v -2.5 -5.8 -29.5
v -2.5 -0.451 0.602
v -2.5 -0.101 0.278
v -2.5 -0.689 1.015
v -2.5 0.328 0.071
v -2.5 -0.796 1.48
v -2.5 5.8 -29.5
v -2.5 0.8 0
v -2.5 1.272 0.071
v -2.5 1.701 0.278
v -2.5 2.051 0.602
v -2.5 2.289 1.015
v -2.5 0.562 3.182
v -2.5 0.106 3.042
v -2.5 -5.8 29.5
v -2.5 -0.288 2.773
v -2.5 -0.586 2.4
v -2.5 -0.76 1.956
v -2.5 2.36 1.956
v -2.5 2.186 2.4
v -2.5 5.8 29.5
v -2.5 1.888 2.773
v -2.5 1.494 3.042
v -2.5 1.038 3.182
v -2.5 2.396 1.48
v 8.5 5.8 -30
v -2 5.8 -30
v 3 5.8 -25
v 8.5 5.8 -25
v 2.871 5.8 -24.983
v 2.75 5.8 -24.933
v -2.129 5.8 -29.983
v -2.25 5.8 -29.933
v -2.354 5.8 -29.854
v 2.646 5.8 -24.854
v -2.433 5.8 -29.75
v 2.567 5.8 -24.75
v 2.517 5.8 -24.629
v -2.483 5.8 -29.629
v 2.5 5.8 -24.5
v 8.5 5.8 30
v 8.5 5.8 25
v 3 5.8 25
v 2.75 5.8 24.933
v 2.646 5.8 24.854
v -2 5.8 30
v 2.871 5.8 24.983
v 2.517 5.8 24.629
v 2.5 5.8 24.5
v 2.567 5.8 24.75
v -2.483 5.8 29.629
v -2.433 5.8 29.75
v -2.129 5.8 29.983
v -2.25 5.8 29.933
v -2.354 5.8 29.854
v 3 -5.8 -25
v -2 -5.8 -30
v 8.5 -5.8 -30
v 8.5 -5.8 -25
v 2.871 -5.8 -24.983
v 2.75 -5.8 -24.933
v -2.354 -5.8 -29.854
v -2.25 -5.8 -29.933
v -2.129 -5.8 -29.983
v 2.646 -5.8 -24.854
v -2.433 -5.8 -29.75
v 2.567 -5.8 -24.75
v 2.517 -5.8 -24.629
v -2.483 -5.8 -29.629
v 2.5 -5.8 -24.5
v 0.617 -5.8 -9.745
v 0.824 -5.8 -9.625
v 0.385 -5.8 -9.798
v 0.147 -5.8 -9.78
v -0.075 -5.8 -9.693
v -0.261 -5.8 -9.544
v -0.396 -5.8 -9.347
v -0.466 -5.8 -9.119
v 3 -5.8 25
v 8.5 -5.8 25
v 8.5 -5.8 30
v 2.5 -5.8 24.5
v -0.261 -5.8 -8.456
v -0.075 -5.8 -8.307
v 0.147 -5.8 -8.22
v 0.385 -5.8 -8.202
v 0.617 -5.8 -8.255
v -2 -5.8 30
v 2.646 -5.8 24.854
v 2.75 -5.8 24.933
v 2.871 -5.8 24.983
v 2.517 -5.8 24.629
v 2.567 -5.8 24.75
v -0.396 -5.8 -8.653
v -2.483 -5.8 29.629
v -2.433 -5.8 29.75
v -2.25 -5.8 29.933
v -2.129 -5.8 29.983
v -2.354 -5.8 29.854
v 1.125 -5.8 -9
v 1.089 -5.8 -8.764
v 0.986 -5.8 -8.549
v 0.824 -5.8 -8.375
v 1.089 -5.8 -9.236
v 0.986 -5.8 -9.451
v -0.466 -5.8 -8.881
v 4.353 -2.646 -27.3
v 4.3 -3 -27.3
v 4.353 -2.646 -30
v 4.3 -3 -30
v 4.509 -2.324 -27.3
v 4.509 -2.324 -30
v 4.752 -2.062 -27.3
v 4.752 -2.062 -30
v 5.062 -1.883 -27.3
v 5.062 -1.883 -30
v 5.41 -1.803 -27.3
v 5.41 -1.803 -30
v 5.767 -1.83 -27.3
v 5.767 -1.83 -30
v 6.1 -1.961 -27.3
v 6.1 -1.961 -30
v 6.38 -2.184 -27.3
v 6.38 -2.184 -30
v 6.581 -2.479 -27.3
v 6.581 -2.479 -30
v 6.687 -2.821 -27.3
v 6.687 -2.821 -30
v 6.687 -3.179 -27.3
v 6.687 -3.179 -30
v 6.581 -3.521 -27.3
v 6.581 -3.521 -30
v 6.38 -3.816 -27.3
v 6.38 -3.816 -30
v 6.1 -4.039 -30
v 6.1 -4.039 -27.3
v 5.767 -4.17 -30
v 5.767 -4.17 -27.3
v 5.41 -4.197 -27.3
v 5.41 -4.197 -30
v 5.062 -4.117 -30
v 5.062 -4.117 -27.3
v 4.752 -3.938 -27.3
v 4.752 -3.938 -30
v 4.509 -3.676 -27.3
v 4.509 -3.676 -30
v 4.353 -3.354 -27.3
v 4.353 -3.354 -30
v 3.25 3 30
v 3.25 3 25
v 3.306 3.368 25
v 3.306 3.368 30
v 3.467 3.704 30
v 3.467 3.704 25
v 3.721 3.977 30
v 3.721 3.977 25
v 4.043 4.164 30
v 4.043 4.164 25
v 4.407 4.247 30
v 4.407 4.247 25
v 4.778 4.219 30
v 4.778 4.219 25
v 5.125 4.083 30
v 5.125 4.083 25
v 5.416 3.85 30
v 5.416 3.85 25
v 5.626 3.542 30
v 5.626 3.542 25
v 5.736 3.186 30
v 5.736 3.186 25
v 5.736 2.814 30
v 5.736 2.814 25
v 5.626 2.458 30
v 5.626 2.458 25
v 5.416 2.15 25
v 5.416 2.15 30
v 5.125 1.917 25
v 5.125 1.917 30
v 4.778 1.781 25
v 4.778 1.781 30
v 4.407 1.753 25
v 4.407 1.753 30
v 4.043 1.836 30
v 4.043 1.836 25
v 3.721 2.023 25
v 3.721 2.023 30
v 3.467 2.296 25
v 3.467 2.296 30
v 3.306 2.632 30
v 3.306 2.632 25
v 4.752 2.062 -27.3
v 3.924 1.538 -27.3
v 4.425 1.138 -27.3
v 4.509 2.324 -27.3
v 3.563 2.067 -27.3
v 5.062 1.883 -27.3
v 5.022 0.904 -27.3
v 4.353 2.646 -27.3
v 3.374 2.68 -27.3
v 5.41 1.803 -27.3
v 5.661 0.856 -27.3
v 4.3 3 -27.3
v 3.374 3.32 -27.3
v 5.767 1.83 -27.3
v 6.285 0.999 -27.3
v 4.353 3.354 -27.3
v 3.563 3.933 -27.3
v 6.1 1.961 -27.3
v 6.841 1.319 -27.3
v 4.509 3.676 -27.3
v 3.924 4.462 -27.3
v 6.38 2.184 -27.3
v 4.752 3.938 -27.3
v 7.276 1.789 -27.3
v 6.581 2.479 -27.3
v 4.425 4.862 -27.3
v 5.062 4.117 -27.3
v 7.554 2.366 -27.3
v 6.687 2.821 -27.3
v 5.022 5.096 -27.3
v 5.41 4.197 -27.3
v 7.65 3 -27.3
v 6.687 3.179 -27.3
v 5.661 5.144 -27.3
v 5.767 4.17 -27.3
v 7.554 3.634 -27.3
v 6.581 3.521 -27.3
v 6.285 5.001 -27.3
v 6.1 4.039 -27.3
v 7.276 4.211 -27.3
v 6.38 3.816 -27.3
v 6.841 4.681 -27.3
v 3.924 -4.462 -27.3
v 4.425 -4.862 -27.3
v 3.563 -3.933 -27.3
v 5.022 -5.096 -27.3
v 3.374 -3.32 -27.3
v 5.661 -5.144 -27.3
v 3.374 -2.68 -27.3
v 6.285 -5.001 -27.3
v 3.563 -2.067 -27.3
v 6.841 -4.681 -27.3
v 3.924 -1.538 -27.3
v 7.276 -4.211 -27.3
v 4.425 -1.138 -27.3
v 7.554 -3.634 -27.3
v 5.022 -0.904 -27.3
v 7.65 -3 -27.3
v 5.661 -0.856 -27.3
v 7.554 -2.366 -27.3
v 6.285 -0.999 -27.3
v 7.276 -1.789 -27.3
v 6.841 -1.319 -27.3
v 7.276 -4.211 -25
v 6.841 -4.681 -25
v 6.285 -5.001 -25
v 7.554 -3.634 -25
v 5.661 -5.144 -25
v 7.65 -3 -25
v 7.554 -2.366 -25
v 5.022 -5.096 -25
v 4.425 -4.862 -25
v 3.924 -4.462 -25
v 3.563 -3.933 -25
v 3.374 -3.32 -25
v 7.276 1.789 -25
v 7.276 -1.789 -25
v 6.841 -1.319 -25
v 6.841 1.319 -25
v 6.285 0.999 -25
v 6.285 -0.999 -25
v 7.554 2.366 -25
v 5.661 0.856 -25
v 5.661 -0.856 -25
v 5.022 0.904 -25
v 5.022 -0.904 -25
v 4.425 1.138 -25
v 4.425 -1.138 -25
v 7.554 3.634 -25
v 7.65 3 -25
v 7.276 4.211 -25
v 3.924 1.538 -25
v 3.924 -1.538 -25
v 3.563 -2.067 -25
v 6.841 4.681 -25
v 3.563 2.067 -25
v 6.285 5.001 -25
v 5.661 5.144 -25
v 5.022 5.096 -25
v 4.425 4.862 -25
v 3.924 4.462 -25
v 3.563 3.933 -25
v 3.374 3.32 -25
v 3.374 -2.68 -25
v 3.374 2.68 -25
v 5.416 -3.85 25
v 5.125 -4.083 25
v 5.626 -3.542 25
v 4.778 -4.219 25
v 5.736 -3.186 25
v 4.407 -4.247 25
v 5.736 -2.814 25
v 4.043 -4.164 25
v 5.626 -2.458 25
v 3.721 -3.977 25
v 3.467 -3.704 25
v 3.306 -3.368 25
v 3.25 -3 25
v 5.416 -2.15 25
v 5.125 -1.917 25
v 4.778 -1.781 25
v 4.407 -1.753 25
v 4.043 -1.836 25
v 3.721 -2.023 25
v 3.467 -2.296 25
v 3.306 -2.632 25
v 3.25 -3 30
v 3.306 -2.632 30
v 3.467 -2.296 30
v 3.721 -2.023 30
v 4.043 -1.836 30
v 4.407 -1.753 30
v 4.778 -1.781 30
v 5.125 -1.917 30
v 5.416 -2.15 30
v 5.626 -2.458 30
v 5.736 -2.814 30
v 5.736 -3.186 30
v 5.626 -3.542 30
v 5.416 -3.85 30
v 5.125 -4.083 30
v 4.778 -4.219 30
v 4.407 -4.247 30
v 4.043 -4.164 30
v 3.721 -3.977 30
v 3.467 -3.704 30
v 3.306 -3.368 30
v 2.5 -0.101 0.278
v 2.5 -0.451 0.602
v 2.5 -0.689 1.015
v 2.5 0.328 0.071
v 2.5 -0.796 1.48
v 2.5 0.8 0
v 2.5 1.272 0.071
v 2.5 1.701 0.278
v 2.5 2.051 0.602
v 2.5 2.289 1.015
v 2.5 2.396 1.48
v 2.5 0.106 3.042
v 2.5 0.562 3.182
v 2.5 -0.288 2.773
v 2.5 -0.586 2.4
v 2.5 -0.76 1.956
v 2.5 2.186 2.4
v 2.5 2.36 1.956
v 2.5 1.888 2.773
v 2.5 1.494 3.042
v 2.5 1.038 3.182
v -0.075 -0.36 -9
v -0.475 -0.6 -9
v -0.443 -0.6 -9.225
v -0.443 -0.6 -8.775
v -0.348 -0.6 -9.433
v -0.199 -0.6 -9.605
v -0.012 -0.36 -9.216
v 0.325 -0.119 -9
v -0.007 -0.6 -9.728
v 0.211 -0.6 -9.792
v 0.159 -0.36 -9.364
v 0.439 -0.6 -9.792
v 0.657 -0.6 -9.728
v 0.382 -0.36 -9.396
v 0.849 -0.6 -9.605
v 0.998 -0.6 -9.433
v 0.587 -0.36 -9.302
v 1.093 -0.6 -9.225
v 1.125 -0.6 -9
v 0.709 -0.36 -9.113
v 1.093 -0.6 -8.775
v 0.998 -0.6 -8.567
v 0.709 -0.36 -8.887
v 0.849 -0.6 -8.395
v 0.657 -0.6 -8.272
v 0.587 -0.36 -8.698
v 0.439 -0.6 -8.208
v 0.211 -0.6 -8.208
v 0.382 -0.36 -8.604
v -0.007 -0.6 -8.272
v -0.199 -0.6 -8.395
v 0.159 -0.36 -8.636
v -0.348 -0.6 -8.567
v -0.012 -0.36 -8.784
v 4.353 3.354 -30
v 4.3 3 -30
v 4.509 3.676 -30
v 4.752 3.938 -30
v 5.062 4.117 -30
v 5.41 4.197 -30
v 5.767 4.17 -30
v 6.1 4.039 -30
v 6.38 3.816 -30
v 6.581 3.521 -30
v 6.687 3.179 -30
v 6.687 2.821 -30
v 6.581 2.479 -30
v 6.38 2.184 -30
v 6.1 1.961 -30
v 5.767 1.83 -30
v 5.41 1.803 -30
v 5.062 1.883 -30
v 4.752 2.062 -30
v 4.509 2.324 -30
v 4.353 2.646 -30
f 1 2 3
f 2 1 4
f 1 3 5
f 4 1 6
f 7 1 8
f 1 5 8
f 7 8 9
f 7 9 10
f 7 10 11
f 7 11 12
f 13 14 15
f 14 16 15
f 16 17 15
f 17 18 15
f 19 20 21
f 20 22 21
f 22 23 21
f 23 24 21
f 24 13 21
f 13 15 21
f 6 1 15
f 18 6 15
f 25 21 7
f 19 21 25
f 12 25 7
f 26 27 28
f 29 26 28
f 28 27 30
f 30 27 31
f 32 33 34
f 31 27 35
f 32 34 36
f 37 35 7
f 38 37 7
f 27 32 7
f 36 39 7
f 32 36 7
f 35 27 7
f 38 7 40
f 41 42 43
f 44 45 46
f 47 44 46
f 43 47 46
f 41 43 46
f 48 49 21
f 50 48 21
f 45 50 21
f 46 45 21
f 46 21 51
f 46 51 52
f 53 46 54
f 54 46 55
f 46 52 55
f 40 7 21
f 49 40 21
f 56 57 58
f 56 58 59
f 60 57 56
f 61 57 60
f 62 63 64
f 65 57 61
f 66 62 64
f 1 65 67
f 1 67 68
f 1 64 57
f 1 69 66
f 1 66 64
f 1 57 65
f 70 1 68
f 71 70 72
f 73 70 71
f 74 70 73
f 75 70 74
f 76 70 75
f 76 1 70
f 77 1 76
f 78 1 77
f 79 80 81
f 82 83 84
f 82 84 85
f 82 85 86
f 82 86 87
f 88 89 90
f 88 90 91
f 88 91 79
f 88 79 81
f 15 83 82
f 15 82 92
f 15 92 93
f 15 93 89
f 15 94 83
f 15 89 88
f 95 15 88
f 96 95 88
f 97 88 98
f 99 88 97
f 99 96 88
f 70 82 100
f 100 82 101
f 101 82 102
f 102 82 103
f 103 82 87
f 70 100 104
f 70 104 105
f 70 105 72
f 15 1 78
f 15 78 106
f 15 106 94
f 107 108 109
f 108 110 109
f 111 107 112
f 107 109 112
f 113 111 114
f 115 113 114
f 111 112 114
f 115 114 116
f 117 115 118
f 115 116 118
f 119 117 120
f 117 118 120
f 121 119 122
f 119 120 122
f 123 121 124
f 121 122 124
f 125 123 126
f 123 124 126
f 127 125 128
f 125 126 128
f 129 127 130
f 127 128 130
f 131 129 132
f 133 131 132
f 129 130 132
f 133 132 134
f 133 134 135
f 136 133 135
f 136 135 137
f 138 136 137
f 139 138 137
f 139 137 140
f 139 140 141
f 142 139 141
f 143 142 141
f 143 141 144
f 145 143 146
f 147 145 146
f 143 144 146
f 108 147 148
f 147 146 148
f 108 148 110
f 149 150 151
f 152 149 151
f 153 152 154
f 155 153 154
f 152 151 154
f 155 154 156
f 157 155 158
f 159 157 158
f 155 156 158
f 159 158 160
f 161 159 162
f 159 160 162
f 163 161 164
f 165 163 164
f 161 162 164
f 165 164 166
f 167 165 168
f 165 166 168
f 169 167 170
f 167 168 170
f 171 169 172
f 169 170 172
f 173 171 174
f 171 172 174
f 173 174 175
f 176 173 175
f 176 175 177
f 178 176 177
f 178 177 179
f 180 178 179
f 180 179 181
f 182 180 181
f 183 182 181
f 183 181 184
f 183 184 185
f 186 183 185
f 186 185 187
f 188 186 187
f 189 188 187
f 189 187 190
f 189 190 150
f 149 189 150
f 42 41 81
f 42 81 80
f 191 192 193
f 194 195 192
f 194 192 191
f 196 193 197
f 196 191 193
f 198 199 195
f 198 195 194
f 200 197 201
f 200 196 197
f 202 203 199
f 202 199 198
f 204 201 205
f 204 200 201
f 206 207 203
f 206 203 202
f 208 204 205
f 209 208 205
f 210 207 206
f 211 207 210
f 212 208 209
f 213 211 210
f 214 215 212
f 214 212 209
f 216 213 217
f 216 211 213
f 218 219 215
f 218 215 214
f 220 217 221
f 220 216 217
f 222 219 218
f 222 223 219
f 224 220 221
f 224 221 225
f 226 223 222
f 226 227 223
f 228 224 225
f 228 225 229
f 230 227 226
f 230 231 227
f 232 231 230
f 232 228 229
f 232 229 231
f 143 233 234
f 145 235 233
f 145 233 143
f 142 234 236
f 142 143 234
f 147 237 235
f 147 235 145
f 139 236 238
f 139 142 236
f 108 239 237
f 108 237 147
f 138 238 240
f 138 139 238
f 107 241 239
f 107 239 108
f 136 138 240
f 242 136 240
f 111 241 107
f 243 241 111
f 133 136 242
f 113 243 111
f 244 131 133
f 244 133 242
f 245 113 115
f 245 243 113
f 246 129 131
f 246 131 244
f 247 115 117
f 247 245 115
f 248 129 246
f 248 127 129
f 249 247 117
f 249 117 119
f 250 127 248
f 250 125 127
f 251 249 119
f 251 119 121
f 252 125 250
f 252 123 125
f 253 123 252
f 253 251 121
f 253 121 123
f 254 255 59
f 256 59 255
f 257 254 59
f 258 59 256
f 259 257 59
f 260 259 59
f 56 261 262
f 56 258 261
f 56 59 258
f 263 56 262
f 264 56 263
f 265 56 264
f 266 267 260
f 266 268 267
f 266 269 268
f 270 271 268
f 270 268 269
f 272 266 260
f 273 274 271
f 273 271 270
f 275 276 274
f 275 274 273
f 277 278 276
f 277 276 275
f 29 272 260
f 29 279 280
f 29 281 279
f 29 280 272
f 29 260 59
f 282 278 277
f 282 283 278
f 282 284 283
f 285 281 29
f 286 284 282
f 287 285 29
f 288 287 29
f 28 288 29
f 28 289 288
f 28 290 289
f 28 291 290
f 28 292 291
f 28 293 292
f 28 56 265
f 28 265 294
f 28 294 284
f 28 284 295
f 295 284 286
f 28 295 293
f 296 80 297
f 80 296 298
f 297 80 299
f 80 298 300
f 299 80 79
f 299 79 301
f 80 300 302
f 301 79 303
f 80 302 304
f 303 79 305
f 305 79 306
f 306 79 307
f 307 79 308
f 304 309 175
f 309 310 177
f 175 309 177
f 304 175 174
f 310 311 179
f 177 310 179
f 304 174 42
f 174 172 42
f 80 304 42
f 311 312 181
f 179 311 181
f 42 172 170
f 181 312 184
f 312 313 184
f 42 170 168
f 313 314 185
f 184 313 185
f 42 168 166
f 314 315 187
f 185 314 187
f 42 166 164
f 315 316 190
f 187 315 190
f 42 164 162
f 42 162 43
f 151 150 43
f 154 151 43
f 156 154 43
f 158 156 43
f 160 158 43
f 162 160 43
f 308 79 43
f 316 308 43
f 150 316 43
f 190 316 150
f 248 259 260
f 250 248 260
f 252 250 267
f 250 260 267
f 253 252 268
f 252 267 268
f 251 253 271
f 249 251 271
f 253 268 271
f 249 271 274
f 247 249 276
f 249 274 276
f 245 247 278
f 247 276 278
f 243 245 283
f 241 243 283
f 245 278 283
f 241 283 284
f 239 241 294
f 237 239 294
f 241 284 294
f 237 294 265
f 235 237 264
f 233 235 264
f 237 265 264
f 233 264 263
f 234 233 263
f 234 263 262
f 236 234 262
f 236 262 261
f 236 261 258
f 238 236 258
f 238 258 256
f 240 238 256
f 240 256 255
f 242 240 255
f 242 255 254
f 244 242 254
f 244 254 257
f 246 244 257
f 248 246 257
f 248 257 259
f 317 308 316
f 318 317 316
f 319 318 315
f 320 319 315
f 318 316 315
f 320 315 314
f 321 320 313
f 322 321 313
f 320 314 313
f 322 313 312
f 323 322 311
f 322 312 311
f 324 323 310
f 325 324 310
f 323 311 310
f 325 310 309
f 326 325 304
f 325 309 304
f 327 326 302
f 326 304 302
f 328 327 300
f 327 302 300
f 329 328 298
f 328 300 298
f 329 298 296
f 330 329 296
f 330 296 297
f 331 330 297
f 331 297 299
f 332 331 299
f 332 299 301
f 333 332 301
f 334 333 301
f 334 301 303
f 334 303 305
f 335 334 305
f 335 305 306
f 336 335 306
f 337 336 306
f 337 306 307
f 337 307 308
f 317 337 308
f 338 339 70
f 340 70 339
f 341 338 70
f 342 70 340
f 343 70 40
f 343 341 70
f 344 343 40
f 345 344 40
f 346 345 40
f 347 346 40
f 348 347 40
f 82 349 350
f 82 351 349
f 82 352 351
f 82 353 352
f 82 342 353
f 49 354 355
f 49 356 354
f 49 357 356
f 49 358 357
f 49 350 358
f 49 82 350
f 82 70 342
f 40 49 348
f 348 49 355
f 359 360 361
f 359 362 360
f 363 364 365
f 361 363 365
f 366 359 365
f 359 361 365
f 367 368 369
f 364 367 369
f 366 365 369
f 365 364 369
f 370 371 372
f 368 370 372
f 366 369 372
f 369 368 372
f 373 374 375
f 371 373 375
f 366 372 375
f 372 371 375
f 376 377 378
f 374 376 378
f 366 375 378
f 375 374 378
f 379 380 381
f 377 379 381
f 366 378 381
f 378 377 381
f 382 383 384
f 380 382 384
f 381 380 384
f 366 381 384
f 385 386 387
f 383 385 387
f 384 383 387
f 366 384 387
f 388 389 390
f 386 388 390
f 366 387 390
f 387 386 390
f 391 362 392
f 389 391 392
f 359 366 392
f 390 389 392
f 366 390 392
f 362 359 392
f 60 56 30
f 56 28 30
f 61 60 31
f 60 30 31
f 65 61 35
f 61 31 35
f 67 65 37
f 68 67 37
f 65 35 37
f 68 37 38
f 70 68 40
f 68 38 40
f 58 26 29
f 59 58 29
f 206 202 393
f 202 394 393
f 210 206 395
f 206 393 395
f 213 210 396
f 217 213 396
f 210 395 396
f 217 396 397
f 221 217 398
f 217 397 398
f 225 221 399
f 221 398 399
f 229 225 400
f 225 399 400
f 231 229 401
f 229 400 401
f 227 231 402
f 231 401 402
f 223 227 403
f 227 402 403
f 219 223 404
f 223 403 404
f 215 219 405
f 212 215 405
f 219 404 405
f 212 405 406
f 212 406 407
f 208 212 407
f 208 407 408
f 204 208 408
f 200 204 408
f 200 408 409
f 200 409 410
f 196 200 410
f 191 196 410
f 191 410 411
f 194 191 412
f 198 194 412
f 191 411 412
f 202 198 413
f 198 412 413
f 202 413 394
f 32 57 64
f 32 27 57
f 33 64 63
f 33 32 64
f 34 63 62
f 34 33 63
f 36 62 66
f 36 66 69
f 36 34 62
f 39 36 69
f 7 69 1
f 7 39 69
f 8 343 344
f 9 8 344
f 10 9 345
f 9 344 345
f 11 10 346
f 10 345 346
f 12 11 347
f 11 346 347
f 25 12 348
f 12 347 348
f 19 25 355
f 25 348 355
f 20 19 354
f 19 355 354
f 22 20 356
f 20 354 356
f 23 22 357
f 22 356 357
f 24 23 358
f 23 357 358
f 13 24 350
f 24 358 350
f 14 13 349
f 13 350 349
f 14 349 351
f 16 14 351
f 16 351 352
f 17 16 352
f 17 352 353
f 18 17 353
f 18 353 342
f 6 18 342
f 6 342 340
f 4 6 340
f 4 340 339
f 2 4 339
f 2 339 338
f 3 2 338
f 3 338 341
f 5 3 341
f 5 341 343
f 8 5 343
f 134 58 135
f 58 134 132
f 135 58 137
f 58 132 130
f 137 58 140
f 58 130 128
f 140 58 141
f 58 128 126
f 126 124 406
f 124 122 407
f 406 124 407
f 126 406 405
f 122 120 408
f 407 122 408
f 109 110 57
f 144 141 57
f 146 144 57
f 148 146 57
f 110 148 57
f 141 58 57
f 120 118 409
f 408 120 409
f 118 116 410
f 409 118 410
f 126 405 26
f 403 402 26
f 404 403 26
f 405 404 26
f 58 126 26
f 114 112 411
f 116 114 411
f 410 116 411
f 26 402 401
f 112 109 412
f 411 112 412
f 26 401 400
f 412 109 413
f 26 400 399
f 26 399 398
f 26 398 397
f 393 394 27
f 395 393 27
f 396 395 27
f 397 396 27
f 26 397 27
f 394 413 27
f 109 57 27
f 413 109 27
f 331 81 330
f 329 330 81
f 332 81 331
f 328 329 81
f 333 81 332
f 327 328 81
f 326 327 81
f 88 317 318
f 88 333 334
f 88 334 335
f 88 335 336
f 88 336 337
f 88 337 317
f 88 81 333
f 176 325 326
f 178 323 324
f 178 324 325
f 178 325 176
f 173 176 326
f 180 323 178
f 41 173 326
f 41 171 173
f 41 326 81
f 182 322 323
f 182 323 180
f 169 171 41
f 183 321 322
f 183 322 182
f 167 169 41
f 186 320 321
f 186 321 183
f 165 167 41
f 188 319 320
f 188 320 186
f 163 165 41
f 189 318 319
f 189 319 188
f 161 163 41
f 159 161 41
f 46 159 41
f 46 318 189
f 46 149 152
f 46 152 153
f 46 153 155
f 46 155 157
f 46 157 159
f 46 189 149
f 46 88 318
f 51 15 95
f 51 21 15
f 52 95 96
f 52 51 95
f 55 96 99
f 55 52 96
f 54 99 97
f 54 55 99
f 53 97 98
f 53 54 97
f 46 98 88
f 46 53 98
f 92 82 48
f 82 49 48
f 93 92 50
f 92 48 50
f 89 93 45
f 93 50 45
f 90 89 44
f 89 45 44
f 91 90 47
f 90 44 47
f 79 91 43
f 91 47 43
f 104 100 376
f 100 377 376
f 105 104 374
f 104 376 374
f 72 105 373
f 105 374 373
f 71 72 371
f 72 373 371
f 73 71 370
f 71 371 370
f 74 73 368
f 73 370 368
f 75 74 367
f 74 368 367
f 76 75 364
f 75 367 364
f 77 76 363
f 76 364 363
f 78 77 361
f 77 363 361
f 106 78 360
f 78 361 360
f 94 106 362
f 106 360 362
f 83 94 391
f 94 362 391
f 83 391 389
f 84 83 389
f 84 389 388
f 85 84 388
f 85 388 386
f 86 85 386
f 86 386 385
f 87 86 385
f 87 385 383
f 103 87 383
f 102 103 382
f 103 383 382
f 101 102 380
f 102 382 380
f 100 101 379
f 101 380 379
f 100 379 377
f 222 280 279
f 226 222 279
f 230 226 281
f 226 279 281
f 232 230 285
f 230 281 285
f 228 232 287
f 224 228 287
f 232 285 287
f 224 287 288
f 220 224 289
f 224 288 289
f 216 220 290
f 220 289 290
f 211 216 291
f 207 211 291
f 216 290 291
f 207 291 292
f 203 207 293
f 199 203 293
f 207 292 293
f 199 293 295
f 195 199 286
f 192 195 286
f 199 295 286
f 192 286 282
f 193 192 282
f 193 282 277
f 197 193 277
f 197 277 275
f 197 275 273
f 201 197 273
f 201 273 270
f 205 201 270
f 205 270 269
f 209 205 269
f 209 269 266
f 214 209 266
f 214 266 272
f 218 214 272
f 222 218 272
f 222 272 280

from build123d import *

# Parameters (mm, degrees)
SKETCH_1_W                  = 5
SKETCH_1_H                  = 11.6
EXTRUDE_1_DEPTH             = 30
SKETCH_2_W                  = 5
SKETCH_2_H                  = 11.6
EXTRUDE_2_DEPTH             = 6
HOLE_WIZARD_M3_1_D          = 2.5
HOLE_WIZARD_M3_1_DEPTH      = 7.5
HOLE_WIZARD_M3_1_TIP        = 0.751075774
HOLE_WIZARD_1_D             = 2.4
HOLE_WIZARD_1_DEPTH         = 7.5
HOLE_WIZARD_1_CBORE_D       = 4.3
HOLE_WIZARD_1_CBORE_DEPTH   = 2.3
HOLE_WIZARD_1_TIP           = 0.721032743
FILLET_1_R                  = 0.5
HOLE_WIZARD_3_2_3_2_1_D     = 3.2
HOLE_WIZARD_3_2_3_2_1_DEPTH = 5.2
HOLE_WIZARD_3_2_3_2_1_TIP   = 0.96137699
HOLE_WIZARD_M2_1_D          = 1.6
HOLE_WIZARD_M2_1_DEPTH      = 5.2
HOLE_WIZARD_M2_1_TIP        = 0.480688495


with BuildPart() as part:
    # 草图1 → 凸台-拉伸1 (new body, symmetric)
    with BuildSketch(Plane.XY):
        Rectangle(SKETCH_1_W, SKETCH_1_H)
    extrude(amount=EXTRUDE_1_DEPTH, both=True)

    # 草图2 → 凸台-拉伸2 (add)
    with BuildSketch(Plane(origin=(2.5, 0, 0), x_dir=(0, 0, -1), z_dir=(1, 0, 0))):
        with Locations((-27.5, 0)):
            Rectangle(SKETCH_2_W, SKETCH_2_H)
    extrude_2 = extrude(amount=EXTRUDE_2_DEPTH)

    # 镜向1: 凸台-拉伸2 across plane
    add(extrude_2.mirror(Plane.XY))

    # M3 螺纹孔1
    with Locations(Plane.XY.offset(30)):
        with Locations((4.5, -3), (4.5, 3)):
            Hole(HOLE_WIZARD_M3_1_D / 2, depth=HOLE_WIZARD_M3_1_DEPTH)
            with Locations((0, 0, -(HOLE_WIZARD_M3_1_DEPTH + HOLE_WIZARD_M3_1_TIP / 2))):  # 118° drill point
                Cone(0, HOLE_WIZARD_M3_1_D / 2, HOLE_WIZARD_M3_1_TIP, mode=Mode.SUBTRACT)

    # 打孔尺寸(%根据)内六角圆柱头螺钉的类型1
    with Locations(Plane.XY.offset(-25)):
        with Locations((5.5, -3), (5.5, 3)):
            CounterBoreHole(HOLE_WIZARD_1_D / 2, HOLE_WIZARD_1_CBORE_D / 2, HOLE_WIZARD_1_CBORE_DEPTH, depth=HOLE_WIZARD_1_DEPTH)
            with Locations((0, 0, -(HOLE_WIZARD_1_DEPTH + HOLE_WIZARD_1_TIP / 2))):  # 118° drill point
                Cone(0, HOLE_WIZARD_1_D / 2, HOLE_WIZARD_1_TIP, mode=Mode.SUBTRACT)

    # 圆角1
    fillet_1_edges = [part.edges().sort_by_distance(p)[0] for p in [
        (2.5, 0, 25),
        (2.5, 0, -25),
        (-2.5, 0, 30),
        (-2.5, 0, -30),
    ]]
    fillet(fillet_1_edges, radius=FILLET_1_R)

    # Ø3.2 (3.2) 直径孔1
    with Locations(Plane.ZY.offset(2.5)):
        with Locations((1.6, 0.8)):
            Hole(HOLE_WIZARD_3_2_3_2_1_D / 2, depth=HOLE_WIZARD_3_2_3_2_1_DEPTH)
            with Locations((0, 0, -(HOLE_WIZARD_3_2_3_2_1_DEPTH + HOLE_WIZARD_3_2_3_2_1_TIP / 2))):  # 118° drill point
                Cone(0, HOLE_WIZARD_3_2_3_2_1_D / 2, HOLE_WIZARD_3_2_3_2_1_TIP, mode=Mode.SUBTRACT)

    # M2 螺纹孔1
    with Locations(Plane(origin=(0, -5.8, 0), x_dir=(-1, 0, 0), z_dir=(0, -1, 0))):
        with Locations((-0.325, 9)):
            Hole(HOLE_WIZARD_M2_1_D / 2, depth=HOLE_WIZARD_M2_1_DEPTH)
            with Locations((0, 0, -(HOLE_WIZARD_M2_1_DEPTH + HOLE_WIZARD_M2_1_TIP / 2))):  # 118° drill point
                Cone(0, HOLE_WIZARD_M2_1_D / 2, HOLE_WIZARD_M2_1_TIP, mode=Mode.SUBTRACT)


solid = part.part
